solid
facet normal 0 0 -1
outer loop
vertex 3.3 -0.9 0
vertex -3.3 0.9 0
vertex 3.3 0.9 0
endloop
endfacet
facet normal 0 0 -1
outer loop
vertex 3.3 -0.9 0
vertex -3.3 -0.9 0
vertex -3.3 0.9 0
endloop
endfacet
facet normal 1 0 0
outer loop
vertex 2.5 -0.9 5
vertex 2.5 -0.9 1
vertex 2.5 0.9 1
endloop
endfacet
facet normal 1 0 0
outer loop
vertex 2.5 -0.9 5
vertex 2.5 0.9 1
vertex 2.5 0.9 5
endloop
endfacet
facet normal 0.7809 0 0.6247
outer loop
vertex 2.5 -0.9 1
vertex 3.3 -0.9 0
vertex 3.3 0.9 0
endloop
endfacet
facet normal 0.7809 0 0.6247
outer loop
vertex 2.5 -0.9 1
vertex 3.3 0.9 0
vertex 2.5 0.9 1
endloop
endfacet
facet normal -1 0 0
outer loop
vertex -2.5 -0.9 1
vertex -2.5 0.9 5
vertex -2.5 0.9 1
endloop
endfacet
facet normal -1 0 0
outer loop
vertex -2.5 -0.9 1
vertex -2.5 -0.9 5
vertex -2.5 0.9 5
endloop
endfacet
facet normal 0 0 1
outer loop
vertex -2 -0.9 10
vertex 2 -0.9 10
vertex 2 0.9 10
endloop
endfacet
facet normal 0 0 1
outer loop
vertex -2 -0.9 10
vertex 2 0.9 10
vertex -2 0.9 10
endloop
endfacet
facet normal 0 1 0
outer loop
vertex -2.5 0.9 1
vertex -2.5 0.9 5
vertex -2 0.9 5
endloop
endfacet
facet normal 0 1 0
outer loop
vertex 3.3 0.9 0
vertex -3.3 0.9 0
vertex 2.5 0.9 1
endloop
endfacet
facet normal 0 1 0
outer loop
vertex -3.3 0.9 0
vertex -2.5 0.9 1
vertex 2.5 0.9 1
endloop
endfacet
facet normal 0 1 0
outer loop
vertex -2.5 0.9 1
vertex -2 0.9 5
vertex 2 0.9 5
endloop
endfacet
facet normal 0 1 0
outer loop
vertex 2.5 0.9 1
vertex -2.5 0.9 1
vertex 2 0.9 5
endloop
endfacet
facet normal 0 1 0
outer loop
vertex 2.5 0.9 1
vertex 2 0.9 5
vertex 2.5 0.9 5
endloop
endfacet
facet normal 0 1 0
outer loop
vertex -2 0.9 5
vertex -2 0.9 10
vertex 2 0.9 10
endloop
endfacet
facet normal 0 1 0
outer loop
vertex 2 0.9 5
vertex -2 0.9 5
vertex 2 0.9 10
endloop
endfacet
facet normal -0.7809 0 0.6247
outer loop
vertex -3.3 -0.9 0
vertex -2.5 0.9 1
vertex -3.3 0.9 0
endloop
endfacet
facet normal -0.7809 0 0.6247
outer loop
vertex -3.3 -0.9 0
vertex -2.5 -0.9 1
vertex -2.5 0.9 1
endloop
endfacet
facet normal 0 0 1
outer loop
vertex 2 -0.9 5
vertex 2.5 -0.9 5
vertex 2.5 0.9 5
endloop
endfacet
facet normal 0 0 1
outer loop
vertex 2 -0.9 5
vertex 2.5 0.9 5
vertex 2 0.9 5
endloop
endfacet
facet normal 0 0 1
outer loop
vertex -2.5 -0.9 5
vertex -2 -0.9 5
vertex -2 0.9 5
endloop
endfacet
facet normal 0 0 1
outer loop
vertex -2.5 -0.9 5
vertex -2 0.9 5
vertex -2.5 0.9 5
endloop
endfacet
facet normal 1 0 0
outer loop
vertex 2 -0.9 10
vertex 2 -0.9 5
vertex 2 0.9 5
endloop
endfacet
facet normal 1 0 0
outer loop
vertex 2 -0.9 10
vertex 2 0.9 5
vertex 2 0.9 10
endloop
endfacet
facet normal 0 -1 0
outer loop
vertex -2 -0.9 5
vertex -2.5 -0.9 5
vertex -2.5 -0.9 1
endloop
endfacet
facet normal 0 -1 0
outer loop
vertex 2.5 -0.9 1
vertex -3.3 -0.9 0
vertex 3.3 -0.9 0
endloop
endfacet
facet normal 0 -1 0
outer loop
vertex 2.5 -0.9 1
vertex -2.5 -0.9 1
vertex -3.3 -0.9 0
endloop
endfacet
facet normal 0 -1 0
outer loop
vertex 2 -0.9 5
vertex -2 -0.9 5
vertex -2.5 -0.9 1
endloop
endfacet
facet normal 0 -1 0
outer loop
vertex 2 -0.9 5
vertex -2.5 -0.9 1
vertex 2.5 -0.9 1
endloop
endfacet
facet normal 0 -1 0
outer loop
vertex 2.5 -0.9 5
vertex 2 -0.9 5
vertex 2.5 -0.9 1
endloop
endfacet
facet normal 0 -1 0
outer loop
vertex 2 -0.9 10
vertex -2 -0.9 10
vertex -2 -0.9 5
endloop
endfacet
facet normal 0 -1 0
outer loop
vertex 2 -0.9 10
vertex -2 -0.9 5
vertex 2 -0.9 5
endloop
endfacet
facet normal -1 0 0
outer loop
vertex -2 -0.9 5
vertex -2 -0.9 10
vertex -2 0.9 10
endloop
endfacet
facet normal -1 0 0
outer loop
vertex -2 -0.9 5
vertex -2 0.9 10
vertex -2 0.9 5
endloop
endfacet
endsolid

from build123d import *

# Parameters (mm, degrees)
PAD_DEPTH = 0.9


with BuildPart() as part:
    # Sketch → Pad (new body, symmetric)
    with BuildSketch(Plane.XZ):
        Polygon((-3.3, 0), (3.3, 0), (2.5, 1), (2.5, 5), (2, 5), (2, 10), (-2, 10), (-2, 5), (-2.5, 5), (-2.5, 1), align=None)
    extrude(amount=PAD_DEPTH, both=True)


solid = part.part
